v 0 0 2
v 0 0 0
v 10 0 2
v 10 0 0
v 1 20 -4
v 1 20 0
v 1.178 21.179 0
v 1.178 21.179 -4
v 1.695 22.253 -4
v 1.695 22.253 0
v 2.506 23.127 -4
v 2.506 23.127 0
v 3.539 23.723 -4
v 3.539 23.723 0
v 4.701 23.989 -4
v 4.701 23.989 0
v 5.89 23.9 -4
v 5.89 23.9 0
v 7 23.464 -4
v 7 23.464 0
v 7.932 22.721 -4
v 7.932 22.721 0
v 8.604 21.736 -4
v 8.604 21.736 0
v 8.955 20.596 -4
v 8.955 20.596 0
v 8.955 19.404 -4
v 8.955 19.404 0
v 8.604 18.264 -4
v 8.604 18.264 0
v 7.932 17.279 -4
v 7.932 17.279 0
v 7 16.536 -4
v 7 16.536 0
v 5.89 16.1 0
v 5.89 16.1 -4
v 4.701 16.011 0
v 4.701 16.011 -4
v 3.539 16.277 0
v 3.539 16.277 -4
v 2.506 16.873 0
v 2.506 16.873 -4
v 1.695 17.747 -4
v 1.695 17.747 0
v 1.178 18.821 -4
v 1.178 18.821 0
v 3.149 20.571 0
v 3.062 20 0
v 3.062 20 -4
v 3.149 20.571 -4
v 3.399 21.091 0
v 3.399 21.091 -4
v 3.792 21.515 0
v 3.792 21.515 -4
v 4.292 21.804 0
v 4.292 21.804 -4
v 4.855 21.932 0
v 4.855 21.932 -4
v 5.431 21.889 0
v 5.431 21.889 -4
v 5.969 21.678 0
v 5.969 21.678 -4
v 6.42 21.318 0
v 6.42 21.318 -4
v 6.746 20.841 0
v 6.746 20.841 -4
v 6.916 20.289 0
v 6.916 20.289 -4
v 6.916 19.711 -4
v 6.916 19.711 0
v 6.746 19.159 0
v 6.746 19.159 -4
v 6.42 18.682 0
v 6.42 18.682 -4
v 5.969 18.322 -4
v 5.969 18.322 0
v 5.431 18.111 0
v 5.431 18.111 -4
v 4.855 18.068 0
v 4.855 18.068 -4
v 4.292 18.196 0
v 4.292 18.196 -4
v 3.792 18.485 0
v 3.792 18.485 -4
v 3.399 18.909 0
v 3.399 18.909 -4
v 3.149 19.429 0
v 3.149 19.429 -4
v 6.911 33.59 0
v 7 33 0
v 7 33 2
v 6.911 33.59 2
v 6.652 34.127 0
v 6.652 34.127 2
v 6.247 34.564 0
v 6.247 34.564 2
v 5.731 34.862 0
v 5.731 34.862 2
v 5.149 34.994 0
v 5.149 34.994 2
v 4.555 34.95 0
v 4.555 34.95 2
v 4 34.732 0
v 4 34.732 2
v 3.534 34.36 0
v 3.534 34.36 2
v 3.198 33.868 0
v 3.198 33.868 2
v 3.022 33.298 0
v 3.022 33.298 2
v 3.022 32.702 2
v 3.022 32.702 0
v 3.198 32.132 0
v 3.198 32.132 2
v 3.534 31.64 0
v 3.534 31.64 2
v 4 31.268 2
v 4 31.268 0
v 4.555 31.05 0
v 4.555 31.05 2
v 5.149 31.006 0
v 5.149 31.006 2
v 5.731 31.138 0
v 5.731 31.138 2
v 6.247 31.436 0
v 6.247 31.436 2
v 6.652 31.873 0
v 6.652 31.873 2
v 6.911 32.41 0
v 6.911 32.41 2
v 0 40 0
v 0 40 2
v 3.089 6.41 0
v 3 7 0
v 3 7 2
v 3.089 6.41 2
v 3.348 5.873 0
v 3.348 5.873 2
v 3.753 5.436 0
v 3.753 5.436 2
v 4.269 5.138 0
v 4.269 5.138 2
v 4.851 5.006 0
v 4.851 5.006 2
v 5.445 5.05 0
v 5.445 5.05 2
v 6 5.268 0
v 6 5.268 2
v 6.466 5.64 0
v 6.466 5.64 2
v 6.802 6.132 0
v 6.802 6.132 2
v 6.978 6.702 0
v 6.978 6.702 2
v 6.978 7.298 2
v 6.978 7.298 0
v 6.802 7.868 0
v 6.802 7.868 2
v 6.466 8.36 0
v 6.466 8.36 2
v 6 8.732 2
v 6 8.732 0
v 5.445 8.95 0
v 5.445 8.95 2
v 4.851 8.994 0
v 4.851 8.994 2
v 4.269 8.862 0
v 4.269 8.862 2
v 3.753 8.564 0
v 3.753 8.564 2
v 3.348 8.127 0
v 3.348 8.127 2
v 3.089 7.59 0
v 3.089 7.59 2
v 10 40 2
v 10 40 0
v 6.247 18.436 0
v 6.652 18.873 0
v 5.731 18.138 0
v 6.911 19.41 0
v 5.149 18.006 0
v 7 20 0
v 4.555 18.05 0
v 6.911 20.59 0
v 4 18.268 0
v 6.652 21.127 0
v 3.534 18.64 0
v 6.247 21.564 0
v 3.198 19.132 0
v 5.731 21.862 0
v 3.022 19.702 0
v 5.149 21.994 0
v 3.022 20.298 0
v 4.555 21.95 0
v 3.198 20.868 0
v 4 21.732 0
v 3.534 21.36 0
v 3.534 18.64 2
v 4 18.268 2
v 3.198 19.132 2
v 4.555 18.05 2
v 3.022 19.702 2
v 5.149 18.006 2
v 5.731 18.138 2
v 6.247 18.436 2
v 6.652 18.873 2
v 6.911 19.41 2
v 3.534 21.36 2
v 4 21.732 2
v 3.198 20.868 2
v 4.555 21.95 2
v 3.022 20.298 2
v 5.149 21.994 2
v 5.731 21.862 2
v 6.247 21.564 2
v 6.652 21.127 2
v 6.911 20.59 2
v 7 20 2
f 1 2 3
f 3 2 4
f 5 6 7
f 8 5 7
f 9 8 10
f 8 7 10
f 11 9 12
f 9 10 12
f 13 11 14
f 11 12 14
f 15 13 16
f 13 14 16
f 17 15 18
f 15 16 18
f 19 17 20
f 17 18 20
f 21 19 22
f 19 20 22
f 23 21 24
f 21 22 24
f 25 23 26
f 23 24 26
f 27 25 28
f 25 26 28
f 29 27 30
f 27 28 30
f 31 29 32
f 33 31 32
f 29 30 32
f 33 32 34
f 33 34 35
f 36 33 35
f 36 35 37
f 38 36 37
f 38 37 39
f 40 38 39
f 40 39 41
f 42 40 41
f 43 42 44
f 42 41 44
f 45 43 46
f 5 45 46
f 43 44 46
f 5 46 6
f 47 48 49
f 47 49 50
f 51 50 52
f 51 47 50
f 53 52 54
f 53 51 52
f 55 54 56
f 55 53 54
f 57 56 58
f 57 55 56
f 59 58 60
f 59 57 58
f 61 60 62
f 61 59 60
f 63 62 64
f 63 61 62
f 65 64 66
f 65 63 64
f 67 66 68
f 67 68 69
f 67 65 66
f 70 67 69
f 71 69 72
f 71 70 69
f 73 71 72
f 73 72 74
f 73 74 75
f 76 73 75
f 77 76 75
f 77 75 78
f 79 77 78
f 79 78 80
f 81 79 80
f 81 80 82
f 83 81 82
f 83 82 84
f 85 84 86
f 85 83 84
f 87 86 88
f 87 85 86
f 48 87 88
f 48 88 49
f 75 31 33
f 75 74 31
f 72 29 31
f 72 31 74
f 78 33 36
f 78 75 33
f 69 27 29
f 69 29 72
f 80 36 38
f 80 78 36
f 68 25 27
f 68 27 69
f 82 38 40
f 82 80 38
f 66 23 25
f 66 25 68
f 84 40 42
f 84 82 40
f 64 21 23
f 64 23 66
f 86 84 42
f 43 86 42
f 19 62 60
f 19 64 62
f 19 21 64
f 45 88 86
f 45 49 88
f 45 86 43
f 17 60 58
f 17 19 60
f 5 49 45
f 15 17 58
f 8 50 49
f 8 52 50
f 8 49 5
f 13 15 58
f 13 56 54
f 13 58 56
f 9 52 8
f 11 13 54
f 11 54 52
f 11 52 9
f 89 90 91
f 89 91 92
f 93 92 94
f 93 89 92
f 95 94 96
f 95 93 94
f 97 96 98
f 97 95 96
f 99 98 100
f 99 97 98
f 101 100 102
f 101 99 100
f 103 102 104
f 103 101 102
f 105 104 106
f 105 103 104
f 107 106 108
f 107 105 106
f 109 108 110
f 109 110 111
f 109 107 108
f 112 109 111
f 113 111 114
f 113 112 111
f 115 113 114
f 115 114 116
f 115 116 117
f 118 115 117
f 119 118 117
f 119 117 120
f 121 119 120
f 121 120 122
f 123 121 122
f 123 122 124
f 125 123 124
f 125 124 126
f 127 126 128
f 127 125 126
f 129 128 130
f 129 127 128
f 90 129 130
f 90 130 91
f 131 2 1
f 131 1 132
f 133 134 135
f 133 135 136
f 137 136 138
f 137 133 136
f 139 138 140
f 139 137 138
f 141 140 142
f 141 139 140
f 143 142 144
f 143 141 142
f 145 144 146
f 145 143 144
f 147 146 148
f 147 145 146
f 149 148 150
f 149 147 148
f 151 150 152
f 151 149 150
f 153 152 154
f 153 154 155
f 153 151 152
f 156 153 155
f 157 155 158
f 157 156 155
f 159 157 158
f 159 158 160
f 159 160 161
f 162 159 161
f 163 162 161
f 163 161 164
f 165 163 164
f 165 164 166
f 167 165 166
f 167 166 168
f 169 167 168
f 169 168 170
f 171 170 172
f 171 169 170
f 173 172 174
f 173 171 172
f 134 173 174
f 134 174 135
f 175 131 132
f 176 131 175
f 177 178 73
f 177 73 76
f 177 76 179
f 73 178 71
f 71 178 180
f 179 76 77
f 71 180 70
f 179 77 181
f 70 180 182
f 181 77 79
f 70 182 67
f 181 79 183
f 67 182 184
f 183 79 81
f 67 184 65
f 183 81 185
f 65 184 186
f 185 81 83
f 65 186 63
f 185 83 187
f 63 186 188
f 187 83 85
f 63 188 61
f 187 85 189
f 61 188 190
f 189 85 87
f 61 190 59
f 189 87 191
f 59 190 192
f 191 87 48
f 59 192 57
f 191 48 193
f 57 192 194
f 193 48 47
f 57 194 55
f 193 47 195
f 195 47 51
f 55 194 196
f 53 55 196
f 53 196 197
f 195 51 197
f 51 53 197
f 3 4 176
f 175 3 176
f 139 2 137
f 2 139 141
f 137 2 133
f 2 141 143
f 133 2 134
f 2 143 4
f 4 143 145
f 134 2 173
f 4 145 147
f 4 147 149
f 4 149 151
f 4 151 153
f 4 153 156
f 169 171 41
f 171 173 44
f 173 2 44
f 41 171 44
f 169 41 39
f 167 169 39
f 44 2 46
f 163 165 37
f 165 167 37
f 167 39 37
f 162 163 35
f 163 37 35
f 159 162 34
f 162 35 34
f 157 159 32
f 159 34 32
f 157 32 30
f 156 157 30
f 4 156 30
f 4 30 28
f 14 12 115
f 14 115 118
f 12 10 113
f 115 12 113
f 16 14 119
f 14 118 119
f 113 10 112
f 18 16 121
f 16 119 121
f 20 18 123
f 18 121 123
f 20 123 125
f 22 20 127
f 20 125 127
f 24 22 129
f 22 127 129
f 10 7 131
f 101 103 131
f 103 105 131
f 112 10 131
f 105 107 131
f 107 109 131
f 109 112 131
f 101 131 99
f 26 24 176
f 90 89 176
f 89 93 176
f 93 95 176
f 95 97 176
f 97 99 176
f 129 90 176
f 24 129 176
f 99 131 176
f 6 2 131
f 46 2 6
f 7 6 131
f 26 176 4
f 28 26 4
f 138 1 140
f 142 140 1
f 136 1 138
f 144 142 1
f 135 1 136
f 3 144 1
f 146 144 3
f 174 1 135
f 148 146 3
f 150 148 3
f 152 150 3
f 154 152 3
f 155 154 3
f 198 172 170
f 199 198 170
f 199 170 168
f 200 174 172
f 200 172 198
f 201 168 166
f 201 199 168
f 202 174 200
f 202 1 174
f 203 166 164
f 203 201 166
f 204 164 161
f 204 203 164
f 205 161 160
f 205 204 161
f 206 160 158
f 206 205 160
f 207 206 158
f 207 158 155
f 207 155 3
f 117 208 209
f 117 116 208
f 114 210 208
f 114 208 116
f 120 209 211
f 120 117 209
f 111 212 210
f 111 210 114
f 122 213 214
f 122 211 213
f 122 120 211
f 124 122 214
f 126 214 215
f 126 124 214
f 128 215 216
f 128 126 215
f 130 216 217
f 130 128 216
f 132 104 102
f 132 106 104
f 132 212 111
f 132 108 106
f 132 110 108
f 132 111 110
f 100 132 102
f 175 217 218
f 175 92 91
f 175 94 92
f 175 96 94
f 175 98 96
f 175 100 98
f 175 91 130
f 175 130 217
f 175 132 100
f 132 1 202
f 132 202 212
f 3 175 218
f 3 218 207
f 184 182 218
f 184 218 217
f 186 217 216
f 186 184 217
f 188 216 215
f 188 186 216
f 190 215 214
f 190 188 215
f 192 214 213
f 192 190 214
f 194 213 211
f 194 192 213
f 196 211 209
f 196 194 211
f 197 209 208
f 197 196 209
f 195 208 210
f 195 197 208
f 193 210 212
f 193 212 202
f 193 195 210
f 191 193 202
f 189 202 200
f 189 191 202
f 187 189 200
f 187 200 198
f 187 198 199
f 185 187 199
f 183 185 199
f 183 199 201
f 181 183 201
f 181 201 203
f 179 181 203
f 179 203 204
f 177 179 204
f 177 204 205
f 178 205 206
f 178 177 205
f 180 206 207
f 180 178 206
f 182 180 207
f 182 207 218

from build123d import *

# Parameters (mm, degrees)
IZIM1_W                     = 10
IZIM1_H                     = 40
IZIM1_R                     = 2
Y_KSEKLIK_EKSTR_ZYON1_DEPTH = 2
IZIM2_R                     = 4
IZIM2_R_2                   = 1.937571625
Y_KSEKLIK_EKSTR_ZYON2_DEPTH = 4


with BuildPart() as part:
    # Çizim1 → Yükseklik-Ekstrüzyon1 (new body)
    with BuildSketch(Plane.XY):
        with Locations((5, 20)):
            Rectangle(IZIM1_W, IZIM1_H)
        with Locations((5, 20)):
            Circle(IZIM1_R, mode=Mode.SUBTRACT)
        with Locations((5, 33)):
            Circle(IZIM1_R, mode=Mode.SUBTRACT)
        with Locations(Location((5, 7, 0), (0, 0, 180))):
            Circle(IZIM1_R, mode=Mode.SUBTRACT)
    extrude(amount=Y_KSEKLIK_EKSTR_ZYON1_DEPTH)

    # Çizim2 → Yükseklik-Ekstrüzyon2 (add)
    with BuildSketch(Plane(origin=(0, 0, 0), x_dir=(-1, 0, 0), z_dir=(0, 0, -1))):
        with Locations((-5, 20)):
            Circle(IZIM2_R)
        with Locations((-5, 20)):
            Circle(IZIM2_R_2, mode=Mode.SUBTRACT)
    extrude(amount=Y_KSEKLIK_EKSTR_ZYON2_DEPTH)


solid = part.part
